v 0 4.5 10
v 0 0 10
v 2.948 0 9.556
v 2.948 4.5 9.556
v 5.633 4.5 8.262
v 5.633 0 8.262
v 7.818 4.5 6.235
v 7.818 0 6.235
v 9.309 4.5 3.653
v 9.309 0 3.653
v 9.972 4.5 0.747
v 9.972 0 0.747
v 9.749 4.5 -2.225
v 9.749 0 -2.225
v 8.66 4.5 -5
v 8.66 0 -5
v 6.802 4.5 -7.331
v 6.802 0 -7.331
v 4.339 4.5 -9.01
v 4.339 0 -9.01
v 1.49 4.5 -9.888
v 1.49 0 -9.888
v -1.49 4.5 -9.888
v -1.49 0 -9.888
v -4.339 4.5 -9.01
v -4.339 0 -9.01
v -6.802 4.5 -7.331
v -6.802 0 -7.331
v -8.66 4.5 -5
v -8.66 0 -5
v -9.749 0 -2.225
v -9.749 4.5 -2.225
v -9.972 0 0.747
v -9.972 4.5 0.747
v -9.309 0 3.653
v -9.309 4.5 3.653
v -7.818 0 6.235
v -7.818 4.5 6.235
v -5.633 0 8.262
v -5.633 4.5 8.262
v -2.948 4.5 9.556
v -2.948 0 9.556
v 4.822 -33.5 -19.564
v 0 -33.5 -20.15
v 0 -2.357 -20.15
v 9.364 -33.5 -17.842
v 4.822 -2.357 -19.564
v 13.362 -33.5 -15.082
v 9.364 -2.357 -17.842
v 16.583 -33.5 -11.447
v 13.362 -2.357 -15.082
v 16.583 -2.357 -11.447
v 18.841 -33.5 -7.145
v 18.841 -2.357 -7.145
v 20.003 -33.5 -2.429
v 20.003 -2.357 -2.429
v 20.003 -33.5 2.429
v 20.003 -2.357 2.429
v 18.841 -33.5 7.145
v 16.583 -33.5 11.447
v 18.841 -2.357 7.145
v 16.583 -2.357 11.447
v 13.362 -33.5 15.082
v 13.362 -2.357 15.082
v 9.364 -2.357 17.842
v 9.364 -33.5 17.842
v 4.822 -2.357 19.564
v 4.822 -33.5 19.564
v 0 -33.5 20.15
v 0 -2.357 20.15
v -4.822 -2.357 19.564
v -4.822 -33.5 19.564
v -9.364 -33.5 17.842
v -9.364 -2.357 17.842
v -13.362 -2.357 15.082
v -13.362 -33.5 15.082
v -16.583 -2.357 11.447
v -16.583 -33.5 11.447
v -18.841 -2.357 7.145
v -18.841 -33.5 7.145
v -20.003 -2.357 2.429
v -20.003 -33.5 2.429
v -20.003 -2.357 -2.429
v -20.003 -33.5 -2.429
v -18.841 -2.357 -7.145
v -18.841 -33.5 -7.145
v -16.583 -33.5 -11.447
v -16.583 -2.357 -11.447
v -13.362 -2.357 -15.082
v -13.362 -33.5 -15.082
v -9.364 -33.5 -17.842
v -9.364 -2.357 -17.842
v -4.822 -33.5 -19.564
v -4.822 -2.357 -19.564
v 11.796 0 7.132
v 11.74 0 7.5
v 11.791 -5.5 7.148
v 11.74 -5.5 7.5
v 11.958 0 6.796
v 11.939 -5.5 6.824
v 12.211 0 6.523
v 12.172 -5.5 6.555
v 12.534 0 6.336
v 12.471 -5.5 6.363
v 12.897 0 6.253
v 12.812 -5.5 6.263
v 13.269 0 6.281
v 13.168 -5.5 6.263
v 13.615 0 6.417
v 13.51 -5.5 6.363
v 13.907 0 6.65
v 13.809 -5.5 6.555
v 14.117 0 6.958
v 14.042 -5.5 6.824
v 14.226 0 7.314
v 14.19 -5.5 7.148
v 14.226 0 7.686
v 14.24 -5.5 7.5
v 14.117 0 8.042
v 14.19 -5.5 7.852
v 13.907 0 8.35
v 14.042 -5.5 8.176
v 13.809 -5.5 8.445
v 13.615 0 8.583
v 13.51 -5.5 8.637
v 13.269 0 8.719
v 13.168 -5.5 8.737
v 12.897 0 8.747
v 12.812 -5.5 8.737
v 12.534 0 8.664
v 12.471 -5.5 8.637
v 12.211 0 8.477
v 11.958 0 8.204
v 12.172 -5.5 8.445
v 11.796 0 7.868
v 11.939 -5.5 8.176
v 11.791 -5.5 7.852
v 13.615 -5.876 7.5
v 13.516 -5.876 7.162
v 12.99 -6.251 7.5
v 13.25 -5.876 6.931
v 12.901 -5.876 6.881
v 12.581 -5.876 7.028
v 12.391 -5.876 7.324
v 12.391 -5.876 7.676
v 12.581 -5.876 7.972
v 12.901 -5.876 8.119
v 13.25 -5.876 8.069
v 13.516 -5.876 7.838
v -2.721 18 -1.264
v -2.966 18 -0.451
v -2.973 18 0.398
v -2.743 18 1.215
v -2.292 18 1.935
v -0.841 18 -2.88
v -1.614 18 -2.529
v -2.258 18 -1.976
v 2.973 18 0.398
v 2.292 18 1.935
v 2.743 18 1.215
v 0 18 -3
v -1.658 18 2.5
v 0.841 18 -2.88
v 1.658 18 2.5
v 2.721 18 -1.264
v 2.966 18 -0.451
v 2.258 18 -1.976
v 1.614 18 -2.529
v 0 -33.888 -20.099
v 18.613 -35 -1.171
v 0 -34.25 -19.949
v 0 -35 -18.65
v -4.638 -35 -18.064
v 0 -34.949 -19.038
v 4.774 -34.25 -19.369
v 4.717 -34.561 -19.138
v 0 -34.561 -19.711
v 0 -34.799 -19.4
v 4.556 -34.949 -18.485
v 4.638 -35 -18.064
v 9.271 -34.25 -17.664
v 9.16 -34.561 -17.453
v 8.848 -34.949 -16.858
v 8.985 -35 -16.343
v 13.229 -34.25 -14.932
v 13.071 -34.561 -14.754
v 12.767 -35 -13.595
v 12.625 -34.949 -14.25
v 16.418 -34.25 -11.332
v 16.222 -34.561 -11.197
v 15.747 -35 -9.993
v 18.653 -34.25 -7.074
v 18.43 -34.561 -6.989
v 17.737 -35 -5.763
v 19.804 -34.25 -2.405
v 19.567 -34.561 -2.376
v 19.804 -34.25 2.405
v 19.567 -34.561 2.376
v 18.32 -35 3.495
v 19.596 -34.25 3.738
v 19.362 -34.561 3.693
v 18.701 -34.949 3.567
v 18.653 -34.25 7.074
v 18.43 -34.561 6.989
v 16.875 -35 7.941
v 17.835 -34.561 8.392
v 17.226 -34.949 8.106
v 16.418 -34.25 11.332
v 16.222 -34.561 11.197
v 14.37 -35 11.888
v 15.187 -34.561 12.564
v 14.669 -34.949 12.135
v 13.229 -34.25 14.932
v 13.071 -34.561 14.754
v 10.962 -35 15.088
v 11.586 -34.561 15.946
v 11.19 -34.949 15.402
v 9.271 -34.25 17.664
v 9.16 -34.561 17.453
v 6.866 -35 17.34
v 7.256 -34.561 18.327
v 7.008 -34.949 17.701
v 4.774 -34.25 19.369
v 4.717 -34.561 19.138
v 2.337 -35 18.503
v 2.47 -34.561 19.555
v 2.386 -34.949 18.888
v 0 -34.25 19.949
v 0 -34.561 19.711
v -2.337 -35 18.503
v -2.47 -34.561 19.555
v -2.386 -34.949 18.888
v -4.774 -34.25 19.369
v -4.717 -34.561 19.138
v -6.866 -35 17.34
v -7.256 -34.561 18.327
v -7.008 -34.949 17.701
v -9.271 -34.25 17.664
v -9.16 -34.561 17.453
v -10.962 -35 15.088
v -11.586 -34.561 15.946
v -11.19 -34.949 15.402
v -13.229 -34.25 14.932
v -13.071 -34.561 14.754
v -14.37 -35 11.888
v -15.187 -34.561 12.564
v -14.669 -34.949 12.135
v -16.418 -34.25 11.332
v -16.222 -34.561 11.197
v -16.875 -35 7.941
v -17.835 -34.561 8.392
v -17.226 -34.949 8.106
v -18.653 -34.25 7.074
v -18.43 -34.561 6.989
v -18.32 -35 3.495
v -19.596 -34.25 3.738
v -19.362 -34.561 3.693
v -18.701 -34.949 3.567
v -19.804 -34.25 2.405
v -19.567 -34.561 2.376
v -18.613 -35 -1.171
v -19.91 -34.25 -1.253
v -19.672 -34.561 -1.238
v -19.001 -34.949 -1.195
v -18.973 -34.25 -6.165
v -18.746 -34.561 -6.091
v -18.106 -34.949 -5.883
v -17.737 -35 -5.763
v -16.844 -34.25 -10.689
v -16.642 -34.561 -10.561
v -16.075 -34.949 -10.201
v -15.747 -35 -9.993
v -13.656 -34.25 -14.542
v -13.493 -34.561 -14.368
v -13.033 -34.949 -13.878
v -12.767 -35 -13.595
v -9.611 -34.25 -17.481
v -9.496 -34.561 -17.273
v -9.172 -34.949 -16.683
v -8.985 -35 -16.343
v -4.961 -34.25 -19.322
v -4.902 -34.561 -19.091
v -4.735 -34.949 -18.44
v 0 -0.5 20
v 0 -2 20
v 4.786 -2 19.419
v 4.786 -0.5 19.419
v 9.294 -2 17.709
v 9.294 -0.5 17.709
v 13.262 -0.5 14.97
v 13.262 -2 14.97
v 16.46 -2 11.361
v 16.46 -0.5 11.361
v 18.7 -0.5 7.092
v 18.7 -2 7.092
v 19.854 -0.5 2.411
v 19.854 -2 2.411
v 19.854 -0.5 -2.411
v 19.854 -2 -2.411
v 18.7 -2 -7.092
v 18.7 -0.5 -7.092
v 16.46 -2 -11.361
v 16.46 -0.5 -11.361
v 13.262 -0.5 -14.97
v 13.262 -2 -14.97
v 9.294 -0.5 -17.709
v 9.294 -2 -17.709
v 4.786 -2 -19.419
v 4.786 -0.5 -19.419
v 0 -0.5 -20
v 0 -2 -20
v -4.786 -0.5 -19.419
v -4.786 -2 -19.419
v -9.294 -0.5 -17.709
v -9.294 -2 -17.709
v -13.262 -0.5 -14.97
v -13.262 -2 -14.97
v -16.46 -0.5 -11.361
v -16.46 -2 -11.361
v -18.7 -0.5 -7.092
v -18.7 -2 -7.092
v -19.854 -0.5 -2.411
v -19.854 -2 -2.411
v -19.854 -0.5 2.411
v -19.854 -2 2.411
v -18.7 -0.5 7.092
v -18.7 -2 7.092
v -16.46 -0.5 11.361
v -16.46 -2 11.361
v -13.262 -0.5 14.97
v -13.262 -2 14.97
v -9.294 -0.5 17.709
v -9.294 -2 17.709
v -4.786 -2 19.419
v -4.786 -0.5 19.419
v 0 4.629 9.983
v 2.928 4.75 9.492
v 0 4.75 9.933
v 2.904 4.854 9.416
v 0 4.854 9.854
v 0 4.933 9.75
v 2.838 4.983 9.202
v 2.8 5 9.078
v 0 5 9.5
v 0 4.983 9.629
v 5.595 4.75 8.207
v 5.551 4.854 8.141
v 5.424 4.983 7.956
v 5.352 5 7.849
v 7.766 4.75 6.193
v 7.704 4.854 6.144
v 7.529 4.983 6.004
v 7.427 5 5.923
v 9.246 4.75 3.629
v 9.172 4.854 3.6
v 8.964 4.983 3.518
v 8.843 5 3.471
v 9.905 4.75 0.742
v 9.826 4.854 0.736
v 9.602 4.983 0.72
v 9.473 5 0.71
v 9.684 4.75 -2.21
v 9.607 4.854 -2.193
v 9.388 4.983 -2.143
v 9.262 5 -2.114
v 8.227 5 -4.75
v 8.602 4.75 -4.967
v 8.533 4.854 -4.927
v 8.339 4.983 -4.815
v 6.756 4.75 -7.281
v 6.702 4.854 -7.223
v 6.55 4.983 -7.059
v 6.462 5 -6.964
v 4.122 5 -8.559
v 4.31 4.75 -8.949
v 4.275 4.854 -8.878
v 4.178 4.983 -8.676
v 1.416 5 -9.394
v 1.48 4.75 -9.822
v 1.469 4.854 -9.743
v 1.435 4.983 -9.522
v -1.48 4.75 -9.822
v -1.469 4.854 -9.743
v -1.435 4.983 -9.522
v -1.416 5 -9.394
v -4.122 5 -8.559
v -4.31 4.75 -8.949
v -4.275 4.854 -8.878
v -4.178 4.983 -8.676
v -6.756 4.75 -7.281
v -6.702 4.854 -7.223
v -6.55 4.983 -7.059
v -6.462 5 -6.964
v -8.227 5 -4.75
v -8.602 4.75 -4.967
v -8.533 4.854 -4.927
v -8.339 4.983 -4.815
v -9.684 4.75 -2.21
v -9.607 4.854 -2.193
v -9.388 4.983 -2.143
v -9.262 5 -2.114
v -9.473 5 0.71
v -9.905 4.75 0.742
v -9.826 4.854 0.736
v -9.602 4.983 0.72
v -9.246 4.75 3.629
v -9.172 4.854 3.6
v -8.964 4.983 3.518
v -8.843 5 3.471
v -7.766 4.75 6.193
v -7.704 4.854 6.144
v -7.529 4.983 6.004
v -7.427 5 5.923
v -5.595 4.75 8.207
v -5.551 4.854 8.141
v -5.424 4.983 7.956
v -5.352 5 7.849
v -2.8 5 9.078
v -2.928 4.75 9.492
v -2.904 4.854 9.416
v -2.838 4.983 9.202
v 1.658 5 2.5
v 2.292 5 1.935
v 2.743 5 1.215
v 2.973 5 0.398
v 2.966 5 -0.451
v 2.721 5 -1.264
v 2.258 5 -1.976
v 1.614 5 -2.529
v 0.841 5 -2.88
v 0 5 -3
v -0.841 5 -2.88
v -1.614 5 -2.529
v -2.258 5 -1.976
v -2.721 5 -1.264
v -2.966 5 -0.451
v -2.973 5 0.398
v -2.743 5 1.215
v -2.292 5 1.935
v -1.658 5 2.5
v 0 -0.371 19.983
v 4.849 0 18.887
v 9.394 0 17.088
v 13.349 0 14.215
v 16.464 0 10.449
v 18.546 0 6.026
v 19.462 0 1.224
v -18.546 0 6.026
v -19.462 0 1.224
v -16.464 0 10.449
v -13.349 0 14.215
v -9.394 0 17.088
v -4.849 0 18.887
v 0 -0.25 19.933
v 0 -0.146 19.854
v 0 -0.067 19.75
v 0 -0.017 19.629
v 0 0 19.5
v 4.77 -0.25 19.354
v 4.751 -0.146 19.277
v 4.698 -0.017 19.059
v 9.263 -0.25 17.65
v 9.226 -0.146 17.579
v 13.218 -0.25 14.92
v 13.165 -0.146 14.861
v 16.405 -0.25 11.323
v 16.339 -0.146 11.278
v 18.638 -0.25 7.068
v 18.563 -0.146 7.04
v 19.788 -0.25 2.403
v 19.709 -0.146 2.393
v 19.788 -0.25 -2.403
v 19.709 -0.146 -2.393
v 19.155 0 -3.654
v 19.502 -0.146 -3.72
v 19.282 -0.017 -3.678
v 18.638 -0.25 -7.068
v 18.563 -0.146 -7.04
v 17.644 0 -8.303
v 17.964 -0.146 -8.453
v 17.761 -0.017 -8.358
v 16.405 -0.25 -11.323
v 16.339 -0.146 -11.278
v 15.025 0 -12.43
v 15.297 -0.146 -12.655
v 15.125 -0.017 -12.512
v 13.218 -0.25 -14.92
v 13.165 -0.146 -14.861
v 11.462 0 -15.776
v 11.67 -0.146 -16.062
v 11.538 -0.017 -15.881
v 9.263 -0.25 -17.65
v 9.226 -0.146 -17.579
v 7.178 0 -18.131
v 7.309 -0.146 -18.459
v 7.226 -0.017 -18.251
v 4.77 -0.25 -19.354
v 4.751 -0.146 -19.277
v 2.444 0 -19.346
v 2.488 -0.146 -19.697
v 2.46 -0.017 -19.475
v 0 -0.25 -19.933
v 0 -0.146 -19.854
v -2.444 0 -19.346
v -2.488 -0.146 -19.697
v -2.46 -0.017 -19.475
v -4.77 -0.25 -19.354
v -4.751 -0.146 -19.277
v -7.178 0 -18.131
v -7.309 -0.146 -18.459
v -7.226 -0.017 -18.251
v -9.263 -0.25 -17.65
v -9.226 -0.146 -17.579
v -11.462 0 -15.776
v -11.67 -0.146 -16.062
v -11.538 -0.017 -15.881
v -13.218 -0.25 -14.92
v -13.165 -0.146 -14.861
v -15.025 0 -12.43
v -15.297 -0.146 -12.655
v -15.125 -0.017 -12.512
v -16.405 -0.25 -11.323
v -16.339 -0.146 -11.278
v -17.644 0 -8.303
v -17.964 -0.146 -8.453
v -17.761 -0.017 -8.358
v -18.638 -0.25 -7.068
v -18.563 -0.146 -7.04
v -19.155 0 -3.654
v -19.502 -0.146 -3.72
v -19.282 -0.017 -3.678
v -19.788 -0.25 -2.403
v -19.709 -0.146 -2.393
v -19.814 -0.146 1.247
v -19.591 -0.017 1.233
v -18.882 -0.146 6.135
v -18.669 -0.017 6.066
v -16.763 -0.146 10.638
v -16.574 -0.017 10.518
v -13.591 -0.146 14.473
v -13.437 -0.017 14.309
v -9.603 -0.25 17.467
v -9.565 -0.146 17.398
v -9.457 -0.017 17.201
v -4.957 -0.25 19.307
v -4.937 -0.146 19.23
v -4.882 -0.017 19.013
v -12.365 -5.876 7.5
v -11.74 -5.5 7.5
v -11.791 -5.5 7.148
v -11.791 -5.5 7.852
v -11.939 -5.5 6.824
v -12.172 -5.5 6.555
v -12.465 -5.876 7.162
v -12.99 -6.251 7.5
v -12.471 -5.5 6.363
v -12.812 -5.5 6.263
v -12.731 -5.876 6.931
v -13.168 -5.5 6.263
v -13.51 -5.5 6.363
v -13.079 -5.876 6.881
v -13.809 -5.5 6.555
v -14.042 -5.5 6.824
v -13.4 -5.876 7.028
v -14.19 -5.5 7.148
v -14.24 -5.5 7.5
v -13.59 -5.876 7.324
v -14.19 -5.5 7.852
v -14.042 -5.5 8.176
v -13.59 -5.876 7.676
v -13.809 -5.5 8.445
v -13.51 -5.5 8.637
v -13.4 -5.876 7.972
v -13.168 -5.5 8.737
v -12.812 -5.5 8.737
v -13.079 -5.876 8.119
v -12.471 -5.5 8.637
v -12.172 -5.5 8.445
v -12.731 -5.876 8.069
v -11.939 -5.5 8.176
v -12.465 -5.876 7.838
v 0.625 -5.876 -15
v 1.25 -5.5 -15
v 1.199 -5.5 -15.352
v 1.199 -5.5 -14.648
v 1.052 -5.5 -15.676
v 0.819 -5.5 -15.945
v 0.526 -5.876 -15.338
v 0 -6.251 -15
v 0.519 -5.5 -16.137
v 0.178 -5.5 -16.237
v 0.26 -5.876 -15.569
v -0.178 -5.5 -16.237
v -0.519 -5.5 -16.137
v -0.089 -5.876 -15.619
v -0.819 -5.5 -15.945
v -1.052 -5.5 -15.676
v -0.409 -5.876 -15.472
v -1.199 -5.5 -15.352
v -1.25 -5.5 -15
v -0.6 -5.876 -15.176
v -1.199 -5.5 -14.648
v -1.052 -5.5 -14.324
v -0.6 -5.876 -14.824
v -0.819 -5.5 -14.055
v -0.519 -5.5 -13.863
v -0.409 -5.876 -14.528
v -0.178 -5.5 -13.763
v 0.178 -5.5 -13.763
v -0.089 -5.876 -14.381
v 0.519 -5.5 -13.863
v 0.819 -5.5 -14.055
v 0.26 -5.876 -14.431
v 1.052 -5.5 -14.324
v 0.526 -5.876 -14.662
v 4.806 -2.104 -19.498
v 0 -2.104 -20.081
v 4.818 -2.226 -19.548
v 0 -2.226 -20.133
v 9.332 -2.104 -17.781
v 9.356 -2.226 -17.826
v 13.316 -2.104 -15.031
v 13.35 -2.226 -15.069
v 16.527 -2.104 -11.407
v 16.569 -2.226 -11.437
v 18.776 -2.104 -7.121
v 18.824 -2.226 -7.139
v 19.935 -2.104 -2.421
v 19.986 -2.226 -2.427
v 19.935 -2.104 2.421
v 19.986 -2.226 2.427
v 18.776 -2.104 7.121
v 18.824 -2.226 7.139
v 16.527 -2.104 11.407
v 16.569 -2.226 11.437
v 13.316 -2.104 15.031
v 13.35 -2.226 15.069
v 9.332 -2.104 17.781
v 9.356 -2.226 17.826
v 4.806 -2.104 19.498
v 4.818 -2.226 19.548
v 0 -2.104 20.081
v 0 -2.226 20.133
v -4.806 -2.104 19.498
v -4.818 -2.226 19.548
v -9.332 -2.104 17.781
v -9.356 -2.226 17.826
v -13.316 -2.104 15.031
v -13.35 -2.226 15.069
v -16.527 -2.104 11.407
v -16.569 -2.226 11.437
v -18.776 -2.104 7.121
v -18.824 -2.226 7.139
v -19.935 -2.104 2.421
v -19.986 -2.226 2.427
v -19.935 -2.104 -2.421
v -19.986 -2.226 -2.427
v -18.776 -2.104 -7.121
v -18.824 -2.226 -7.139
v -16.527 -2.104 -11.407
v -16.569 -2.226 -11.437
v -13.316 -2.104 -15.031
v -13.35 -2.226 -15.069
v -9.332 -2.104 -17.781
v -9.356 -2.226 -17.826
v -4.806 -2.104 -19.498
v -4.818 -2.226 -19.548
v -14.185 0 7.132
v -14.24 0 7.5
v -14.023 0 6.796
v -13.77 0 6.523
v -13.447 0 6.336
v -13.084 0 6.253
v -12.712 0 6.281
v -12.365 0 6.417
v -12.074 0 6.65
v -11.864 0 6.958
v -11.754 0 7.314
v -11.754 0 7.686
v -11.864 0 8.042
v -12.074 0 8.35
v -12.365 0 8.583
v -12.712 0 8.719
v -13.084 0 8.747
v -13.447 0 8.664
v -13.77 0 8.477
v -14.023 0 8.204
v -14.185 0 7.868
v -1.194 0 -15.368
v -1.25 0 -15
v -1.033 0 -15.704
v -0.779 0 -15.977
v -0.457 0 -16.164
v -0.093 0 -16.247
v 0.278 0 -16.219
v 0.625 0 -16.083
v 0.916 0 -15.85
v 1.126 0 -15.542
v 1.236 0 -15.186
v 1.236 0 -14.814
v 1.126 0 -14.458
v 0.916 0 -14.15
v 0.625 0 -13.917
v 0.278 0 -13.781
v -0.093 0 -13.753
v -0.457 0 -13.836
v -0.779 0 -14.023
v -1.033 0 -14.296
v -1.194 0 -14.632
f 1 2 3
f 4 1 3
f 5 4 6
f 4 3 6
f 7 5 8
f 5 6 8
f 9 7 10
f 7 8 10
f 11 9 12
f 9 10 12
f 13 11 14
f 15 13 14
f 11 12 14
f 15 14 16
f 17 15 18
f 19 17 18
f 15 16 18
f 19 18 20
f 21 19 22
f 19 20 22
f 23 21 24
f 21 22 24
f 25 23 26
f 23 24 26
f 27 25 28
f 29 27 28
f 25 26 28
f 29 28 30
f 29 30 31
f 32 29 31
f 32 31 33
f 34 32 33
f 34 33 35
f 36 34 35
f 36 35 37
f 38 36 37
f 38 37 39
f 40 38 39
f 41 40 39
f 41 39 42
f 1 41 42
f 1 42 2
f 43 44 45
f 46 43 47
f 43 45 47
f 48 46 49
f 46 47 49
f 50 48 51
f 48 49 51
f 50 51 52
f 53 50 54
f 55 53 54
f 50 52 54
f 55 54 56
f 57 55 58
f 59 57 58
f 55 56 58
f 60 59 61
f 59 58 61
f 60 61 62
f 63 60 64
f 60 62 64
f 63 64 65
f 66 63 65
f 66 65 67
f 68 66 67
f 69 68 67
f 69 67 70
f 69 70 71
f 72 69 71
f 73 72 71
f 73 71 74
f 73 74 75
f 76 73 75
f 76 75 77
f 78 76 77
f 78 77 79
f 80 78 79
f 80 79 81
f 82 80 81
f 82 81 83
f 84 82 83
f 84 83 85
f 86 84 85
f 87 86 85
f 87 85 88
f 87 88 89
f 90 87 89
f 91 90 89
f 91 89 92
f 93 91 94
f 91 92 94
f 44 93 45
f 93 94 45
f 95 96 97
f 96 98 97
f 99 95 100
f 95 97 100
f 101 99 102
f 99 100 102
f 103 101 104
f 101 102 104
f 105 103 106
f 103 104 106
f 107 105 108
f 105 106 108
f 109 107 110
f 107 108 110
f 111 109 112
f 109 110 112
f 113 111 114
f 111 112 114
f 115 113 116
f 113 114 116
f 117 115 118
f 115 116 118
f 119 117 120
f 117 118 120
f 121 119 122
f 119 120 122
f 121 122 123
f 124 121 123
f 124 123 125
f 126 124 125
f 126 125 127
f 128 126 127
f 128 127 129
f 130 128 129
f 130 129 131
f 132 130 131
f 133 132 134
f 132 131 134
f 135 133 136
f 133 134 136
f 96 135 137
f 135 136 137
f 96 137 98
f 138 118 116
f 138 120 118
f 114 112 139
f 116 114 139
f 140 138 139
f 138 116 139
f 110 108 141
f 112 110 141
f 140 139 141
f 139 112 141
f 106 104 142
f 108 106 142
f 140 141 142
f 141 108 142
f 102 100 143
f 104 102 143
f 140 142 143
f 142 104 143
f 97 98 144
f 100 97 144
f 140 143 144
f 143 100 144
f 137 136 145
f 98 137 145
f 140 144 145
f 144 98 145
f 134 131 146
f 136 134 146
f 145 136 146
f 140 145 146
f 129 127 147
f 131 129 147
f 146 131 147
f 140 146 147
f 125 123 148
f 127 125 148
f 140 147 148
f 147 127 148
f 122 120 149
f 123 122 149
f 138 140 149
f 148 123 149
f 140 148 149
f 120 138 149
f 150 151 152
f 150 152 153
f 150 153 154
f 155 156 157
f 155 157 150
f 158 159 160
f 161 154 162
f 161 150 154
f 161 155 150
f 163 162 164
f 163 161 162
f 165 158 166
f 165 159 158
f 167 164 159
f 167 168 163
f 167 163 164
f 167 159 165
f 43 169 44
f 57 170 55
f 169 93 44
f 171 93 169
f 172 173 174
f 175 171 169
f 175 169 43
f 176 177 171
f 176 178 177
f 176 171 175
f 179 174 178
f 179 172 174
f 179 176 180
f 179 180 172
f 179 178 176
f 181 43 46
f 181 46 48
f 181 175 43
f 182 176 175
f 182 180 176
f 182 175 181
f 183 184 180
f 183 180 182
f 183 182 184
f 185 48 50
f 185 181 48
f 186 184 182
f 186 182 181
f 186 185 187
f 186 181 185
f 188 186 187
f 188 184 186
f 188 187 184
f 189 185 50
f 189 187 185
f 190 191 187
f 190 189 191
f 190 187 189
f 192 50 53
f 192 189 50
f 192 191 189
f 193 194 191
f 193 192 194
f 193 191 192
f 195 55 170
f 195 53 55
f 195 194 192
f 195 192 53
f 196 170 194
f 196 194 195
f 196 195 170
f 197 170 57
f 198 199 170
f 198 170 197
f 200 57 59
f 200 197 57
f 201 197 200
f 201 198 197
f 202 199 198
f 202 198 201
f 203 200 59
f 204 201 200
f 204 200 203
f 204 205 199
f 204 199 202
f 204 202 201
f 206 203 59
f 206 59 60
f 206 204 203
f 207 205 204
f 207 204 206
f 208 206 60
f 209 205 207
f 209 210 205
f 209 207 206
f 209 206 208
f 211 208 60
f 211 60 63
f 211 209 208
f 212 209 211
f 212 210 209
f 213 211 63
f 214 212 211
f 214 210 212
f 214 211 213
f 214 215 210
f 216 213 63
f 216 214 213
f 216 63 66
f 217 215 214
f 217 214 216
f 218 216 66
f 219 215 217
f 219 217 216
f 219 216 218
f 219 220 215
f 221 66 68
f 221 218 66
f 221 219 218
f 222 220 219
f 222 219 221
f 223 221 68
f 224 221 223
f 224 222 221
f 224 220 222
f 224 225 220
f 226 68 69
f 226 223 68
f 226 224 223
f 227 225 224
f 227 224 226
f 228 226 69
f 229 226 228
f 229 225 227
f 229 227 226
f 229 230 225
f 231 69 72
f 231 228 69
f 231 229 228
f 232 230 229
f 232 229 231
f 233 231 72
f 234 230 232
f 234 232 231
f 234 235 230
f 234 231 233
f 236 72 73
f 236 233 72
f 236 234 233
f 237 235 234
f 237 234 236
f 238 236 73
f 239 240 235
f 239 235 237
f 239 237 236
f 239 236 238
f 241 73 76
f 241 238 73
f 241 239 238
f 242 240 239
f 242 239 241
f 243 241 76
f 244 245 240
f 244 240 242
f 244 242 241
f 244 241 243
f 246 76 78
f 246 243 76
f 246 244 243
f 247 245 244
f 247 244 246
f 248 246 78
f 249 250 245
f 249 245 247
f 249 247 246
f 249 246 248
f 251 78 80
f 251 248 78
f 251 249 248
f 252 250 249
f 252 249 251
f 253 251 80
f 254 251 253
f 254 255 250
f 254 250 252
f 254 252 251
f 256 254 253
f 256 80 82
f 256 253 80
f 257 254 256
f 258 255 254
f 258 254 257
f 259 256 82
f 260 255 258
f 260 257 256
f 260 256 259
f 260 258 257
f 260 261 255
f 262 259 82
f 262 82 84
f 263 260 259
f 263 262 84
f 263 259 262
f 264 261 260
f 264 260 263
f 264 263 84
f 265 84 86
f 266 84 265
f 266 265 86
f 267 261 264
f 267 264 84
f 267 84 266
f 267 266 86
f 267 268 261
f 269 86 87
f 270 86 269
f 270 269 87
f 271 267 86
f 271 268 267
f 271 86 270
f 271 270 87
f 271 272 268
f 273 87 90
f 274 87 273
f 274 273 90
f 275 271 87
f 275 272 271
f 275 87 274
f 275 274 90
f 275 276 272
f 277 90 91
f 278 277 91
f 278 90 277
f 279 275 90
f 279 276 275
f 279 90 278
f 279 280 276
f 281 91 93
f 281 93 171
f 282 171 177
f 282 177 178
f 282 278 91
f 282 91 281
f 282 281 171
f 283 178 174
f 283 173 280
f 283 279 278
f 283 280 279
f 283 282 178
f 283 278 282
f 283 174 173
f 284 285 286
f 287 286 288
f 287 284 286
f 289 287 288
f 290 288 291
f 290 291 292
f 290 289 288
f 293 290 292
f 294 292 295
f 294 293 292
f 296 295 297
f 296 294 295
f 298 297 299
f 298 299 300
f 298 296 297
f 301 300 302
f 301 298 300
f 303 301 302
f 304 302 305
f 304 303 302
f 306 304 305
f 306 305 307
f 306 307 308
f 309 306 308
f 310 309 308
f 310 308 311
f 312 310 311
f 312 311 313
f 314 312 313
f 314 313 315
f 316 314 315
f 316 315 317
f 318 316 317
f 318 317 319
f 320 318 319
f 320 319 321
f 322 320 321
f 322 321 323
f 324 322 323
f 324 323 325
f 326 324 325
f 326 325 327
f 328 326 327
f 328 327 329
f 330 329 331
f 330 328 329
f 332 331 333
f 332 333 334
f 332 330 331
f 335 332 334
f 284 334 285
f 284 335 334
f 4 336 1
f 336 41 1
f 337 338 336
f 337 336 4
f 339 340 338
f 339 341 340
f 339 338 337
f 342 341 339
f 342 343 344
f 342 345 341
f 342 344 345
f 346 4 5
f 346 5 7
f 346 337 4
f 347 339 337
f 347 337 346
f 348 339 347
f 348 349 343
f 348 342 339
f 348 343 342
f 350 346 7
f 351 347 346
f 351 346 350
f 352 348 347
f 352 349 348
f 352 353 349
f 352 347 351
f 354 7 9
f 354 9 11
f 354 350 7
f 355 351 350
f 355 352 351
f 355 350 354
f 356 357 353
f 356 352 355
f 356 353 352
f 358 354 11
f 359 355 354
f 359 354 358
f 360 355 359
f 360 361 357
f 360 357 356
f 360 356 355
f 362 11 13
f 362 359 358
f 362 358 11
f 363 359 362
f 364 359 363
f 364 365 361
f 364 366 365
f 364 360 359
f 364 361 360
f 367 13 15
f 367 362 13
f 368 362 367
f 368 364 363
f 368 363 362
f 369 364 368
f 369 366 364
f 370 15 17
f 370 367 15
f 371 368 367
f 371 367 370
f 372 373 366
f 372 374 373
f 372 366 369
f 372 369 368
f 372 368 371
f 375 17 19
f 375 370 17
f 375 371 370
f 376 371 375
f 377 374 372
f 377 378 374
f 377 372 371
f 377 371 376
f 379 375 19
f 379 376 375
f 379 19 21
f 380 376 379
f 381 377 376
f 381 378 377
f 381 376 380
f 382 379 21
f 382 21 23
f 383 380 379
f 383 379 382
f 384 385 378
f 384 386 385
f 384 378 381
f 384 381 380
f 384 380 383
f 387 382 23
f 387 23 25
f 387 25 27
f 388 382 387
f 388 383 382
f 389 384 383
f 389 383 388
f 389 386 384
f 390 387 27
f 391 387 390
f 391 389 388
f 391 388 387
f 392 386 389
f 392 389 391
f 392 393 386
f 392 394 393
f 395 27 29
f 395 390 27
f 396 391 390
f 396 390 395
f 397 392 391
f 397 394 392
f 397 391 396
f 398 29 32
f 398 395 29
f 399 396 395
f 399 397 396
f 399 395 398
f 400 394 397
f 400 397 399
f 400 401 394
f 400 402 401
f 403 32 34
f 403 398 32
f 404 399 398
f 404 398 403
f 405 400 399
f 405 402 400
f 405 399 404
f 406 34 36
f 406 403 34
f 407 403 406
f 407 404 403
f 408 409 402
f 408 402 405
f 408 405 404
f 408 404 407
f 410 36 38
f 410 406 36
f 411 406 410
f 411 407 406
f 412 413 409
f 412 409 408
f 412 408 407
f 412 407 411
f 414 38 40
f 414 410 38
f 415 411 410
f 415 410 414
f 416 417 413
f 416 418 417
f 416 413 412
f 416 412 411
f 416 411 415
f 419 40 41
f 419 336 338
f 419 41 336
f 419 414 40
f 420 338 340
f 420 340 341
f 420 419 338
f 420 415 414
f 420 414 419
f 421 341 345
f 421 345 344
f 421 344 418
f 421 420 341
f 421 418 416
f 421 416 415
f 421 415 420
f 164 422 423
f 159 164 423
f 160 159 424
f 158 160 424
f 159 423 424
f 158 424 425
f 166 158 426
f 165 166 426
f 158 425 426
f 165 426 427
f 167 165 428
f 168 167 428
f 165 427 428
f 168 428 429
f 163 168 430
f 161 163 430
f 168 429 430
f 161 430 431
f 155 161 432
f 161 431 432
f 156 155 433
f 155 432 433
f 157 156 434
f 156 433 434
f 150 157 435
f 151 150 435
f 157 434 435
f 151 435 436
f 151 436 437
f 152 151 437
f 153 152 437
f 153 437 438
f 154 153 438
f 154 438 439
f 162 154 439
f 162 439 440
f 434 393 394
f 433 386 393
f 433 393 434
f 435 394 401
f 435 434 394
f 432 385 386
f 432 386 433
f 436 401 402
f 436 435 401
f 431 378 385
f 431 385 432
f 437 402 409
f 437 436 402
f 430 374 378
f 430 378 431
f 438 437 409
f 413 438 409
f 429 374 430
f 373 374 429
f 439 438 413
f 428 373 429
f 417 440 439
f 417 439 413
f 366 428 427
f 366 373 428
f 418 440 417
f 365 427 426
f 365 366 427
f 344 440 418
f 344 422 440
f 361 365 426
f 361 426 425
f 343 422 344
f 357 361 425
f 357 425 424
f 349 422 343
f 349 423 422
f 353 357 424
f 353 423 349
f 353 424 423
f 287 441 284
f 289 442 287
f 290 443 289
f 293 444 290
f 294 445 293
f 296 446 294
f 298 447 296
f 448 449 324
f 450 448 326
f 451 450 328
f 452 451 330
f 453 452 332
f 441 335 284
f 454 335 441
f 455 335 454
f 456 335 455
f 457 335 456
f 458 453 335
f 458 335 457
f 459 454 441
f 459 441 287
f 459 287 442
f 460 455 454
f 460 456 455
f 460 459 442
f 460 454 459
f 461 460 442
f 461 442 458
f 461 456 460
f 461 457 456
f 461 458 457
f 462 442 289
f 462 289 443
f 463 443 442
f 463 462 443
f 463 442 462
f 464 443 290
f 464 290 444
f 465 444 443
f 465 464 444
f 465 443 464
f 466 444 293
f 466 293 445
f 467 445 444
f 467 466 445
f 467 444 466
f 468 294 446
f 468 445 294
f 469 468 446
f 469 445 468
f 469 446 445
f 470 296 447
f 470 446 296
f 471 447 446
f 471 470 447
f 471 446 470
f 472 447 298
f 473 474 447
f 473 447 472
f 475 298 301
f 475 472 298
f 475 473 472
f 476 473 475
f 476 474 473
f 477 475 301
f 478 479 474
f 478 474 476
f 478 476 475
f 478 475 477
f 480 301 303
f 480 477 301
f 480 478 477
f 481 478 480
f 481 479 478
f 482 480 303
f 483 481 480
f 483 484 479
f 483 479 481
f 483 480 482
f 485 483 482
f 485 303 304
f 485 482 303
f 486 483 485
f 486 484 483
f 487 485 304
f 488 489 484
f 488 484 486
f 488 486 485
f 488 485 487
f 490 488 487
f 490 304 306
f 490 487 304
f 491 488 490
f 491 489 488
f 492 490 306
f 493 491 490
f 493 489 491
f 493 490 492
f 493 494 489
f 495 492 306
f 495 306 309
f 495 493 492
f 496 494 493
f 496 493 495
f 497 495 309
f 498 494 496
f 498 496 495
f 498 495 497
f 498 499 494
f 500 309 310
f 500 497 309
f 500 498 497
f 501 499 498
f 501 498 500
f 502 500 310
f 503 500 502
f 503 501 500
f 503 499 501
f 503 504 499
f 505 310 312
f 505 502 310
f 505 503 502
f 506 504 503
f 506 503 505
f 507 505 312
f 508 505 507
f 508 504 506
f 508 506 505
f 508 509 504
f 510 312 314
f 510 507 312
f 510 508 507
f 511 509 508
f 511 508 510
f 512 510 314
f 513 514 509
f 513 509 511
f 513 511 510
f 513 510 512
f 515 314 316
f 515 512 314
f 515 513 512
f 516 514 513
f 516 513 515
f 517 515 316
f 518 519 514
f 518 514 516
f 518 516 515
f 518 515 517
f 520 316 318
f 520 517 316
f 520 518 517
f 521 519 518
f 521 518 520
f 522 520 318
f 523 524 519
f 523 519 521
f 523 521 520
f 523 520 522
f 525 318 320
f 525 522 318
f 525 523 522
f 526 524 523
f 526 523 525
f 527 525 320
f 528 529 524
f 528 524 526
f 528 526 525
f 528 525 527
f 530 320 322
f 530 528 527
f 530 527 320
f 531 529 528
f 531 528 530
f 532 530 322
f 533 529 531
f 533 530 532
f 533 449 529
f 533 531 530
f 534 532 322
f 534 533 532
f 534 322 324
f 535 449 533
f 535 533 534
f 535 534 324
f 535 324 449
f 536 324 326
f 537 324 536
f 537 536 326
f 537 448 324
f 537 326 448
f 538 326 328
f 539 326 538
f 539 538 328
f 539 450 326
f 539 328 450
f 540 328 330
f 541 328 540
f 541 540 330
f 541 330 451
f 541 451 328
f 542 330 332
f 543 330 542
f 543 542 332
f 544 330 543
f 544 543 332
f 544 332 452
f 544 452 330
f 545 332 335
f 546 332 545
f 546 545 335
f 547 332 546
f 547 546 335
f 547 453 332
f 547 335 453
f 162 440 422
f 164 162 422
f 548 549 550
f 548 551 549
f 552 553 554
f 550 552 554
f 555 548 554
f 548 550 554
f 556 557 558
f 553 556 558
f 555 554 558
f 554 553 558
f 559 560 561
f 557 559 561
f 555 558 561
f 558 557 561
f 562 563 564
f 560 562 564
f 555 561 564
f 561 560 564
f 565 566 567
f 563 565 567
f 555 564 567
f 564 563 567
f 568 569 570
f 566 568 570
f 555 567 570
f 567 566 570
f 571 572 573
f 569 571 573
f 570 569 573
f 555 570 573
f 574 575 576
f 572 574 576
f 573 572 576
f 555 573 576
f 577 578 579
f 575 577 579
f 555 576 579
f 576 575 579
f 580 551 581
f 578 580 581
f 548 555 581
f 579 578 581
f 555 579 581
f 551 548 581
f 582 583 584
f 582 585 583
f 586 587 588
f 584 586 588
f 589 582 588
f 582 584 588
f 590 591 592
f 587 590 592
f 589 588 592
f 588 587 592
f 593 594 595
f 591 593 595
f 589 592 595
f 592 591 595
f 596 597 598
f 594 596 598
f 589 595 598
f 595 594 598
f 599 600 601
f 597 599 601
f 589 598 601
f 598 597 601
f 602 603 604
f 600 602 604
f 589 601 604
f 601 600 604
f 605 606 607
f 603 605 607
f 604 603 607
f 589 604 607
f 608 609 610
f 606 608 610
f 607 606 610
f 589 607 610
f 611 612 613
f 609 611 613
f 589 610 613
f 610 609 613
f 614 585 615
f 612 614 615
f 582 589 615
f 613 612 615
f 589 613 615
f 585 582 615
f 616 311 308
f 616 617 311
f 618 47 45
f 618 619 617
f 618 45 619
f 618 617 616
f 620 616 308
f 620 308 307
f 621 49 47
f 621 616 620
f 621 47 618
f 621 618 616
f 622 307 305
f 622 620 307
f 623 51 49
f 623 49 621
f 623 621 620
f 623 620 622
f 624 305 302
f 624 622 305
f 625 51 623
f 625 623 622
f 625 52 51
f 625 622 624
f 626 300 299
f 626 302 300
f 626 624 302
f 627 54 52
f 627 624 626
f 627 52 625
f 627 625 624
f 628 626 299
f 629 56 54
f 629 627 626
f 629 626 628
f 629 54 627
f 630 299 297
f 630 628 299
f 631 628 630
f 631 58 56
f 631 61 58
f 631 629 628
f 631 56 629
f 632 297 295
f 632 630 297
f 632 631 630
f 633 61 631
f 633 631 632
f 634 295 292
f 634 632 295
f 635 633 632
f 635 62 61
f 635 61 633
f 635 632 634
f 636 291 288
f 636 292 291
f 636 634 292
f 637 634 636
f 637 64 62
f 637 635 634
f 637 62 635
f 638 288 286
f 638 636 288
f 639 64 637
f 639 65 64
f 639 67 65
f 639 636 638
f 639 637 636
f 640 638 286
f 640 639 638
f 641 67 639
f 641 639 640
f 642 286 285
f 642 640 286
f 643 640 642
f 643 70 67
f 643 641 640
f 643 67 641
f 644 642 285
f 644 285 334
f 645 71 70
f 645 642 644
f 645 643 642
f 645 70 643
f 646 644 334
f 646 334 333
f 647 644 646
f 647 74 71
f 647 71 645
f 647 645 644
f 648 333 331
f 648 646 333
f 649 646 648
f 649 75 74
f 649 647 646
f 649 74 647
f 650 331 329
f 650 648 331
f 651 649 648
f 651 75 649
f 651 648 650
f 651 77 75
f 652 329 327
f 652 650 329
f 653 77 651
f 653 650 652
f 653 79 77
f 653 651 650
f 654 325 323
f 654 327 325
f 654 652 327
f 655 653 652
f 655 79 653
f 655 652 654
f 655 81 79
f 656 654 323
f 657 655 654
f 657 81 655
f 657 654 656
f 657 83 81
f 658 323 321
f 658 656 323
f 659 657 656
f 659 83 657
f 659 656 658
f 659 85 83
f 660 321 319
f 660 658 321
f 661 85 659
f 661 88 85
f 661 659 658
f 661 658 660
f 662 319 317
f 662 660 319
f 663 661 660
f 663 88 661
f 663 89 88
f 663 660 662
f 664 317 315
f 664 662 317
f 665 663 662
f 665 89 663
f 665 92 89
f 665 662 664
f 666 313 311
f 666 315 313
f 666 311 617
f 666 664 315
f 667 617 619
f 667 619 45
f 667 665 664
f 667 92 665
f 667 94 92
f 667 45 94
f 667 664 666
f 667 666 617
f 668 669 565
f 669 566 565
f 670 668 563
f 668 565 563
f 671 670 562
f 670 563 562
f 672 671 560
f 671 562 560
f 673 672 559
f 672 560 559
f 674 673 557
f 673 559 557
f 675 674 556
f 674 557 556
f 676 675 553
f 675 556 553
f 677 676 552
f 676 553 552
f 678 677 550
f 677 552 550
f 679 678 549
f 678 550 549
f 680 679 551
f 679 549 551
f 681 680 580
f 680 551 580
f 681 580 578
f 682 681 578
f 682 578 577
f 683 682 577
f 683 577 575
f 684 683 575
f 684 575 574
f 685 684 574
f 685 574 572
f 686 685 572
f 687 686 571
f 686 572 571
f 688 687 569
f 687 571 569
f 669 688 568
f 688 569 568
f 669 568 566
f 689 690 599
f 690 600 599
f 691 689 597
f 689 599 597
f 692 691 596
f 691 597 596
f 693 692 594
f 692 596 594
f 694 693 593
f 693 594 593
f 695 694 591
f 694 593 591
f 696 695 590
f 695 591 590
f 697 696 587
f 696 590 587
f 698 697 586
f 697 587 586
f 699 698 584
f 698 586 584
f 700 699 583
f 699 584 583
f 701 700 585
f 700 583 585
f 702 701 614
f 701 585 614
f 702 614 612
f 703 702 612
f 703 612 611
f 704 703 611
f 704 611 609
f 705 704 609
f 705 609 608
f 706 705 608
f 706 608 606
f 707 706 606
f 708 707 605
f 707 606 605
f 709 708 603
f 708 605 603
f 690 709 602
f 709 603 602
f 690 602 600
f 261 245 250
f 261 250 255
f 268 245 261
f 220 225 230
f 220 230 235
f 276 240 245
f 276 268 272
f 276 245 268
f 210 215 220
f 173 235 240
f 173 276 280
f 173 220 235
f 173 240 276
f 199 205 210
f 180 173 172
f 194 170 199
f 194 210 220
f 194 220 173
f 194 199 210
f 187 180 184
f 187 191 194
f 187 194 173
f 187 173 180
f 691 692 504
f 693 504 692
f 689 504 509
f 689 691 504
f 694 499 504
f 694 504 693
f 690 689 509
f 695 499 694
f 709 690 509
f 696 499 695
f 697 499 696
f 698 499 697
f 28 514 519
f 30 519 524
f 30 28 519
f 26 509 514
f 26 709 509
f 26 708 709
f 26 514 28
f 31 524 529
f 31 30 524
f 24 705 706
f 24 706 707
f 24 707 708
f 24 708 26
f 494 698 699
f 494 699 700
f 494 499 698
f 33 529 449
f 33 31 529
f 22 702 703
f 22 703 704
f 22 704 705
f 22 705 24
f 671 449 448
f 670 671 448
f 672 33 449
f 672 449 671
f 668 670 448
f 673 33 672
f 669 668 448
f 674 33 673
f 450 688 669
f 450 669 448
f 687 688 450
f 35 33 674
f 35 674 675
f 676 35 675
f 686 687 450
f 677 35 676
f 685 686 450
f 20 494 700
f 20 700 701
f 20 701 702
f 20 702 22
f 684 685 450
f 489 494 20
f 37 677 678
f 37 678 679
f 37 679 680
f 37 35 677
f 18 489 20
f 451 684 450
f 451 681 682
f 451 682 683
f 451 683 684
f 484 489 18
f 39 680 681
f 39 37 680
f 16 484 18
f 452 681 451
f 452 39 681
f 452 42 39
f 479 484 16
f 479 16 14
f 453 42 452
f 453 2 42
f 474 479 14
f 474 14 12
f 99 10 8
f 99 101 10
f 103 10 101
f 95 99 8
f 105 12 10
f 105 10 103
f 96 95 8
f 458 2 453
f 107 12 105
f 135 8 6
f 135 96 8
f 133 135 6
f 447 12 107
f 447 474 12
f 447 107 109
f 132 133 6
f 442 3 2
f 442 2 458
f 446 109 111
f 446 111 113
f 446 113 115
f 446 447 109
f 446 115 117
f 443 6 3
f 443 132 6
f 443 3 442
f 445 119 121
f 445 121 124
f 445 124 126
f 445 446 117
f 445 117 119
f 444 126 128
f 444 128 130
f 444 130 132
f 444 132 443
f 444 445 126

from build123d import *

# Parameters (mm, degrees)
SKETCH1_R                 = 20
BOSS_EXTRUDE1_DEPTH       = 2
SKETCH4_R                 = 20.15
BOSS_EXTRUDE3_DEPTH       = 33
SKETCH5_R                 = 10
BOSS_EXTRUDE4_DEPTH       = 5
BOSS_EXTRUDE5_DEPTH       = 13
FILLET2_R                 = 0.5
FILLET3_R                 = 1.5
M3X0_5_TAPPED_HOLE1_D     = 2.5
M3X0_5_TAPPED_HOLE1_DEPTH = 5.5
M3X0_5_TAPPED_HOLE1_TIP   = 0.751075774


with BuildPart() as part:
    # Sketch1 → Boss-Extrude1 (new body)
    with BuildSketch(Plane(origin=(0, 0, 0), x_dir=(1, 0, 0), z_dir=(0, 1, 0))):
        with Locations(Location((0, 0, 0), (0, 0, 270))):
            Circle(SKETCH1_R)
    extrude(amount=-BOSS_EXTRUDE1_DEPTH)

    # Sketch4 → Boss-Extrude3 (add)
    with BuildSketch(Plane.XZ.offset(2)):
        with Locations(Location((0, 0, 0), (0, 0, 270))):
            Circle(SKETCH4_R)
    extrude(amount=BOSS_EXTRUDE3_DEPTH)

    # Sketch5 → Boss-Extrude4 (add)
    with BuildSketch(Plane(origin=(0, 0, 0), x_dir=(1, 0, 0), z_dir=(0, 1, 0))):
        with Locations(Location((0, 0, 0), (0, 0, 270))):
            Circle(SKETCH5_R)
    extrude(amount=BOSS_EXTRUDE4_DEPTH)

    # Sketch7 → Boss-Extrude5 (add)
    with BuildSketch(Plane(origin=(0, 5, 0), x_dir=(1, 0, 0), z_dir=(0, 1, 0))):
        with BuildLine():
            Line((-1.658312395, -2.5), (1.658312395, -2.5))
            ThreePointArc((1.658312395, -2.5), (0, 3), (-1.658312395, -2.5))
        make_face()
    extrude(amount=BOSS_EXTRUDE5_DEPTH)

    # Fillet2
    # the kernel refuses this fillet: 0.5 mm, written as the material it takes off along each edge
    with BuildSketch(Plane(origin=(0, 5, 0), x_dir=(0, 0, 1), z_dir=(-1, 0, 0))) as fillet2_piece_1:
        with BuildLine():
            CenterArc((10 - FILLET2_R, -FILLET2_R), FILLET2_R, 0, 90)
            Line((10 - FILLET2_R, 0), (10 - FILLET2_R, FILLET2_R * 0.02))
            Line((10 - FILLET2_R, FILLET2_R * 0.02), (10 + FILLET2_R * 0.02, FILLET2_R * 0.02))
            Line((10 + FILLET2_R * 0.02, FILLET2_R * 0.02), (10 + FILLET2_R * 0.02, -FILLET2_R))
            Line((10 + FILLET2_R * 0.02, -FILLET2_R), (10, -FILLET2_R))
        make_face()
    revolve(axis=Axis((0, 5, 0), (0, 1, 0)), mode=Mode.SUBTRACT)
    with BuildSketch(Plane(origin=(0, 0, 0), x_dir=(0, 0, 1), z_dir=(-1, 0, 0))) as fillet2_piece_2:
        with BuildLine():
            CenterArc((20 - FILLET2_R, -FILLET2_R), FILLET2_R, 0, 90)
            Line((20 - FILLET2_R, 0), (20 - FILLET2_R, FILLET2_R * 0.02))
            Line((20 - FILLET2_R, FILLET2_R * 0.02), (20 + FILLET2_R * 0.02, FILLET2_R * 0.02))
            Line((20 + FILLET2_R * 0.02, FILLET2_R * 0.02), (20 + FILLET2_R * 0.02, -FILLET2_R))
            Line((20 + FILLET2_R * 0.02, -FILLET2_R), (20, -FILLET2_R))
        make_face()
    revolve(axis=Axis((0, 0, 0), (0, 1, 0)), mode=Mode.SUBTRACT)
    with BuildSketch(Plane(origin=(0, -2, 0), x_dir=(0, 0, -1), z_dir=(-1, 0, 0))) as fillet2_piece_3:
        with BuildLine():
            CenterArc((19.65, 0.357071421), FILLET2_R, 314.427004001, 45.572995999)
            Line((20, 0), (20.007, -0.007141428))
            ThreePointArc((20.007, -0.007141428), (20.075, -0.01), (20.15, -0.01))
            Line((20.15, -0.01), (20.16, 0))
            Line((20.16, 0), (20.16, 0.357071421))
            Line((20.16, 0.357071421), (20.15, 0.357071421))
        make_face()
    revolve(axis=Axis((0, -2, 0), (0, -1, 0)), mode=Mode.SUBTRACT)

    # Fillet3
    fillet3_edges = [part.edges().sort_by_distance(p)[0] for p in [
        (0, -35, 20.15),
    ]]
    fillet(fillet3_edges, radius=FILLET3_R)

    # M3x0.5 Tapped Hole1
    with Locations(Plane(origin=(0, 0, 0), x_dir=(1, 0, 0), z_dir=(0, 1, 0))):
        with Locations((0, 15), (12.990381057, -7.5), (-12.990381057, -7.5)):
            Hole(M3X0_5_TAPPED_HOLE1_D / 2, depth=M3X0_5_TAPPED_HOLE1_DEPTH)
            with Locations((0, 0, -(M3X0_5_TAPPED_HOLE1_DEPTH + M3X0_5_TAPPED_HOLE1_TIP / 2))):  # 118° drill point
                Cone(0, M3X0_5_TAPPED_HOLE1_D / 2, M3X0_5_TAPPED_HOLE1_TIP, mode=Mode.SUBTRACT)


solid = part.part
